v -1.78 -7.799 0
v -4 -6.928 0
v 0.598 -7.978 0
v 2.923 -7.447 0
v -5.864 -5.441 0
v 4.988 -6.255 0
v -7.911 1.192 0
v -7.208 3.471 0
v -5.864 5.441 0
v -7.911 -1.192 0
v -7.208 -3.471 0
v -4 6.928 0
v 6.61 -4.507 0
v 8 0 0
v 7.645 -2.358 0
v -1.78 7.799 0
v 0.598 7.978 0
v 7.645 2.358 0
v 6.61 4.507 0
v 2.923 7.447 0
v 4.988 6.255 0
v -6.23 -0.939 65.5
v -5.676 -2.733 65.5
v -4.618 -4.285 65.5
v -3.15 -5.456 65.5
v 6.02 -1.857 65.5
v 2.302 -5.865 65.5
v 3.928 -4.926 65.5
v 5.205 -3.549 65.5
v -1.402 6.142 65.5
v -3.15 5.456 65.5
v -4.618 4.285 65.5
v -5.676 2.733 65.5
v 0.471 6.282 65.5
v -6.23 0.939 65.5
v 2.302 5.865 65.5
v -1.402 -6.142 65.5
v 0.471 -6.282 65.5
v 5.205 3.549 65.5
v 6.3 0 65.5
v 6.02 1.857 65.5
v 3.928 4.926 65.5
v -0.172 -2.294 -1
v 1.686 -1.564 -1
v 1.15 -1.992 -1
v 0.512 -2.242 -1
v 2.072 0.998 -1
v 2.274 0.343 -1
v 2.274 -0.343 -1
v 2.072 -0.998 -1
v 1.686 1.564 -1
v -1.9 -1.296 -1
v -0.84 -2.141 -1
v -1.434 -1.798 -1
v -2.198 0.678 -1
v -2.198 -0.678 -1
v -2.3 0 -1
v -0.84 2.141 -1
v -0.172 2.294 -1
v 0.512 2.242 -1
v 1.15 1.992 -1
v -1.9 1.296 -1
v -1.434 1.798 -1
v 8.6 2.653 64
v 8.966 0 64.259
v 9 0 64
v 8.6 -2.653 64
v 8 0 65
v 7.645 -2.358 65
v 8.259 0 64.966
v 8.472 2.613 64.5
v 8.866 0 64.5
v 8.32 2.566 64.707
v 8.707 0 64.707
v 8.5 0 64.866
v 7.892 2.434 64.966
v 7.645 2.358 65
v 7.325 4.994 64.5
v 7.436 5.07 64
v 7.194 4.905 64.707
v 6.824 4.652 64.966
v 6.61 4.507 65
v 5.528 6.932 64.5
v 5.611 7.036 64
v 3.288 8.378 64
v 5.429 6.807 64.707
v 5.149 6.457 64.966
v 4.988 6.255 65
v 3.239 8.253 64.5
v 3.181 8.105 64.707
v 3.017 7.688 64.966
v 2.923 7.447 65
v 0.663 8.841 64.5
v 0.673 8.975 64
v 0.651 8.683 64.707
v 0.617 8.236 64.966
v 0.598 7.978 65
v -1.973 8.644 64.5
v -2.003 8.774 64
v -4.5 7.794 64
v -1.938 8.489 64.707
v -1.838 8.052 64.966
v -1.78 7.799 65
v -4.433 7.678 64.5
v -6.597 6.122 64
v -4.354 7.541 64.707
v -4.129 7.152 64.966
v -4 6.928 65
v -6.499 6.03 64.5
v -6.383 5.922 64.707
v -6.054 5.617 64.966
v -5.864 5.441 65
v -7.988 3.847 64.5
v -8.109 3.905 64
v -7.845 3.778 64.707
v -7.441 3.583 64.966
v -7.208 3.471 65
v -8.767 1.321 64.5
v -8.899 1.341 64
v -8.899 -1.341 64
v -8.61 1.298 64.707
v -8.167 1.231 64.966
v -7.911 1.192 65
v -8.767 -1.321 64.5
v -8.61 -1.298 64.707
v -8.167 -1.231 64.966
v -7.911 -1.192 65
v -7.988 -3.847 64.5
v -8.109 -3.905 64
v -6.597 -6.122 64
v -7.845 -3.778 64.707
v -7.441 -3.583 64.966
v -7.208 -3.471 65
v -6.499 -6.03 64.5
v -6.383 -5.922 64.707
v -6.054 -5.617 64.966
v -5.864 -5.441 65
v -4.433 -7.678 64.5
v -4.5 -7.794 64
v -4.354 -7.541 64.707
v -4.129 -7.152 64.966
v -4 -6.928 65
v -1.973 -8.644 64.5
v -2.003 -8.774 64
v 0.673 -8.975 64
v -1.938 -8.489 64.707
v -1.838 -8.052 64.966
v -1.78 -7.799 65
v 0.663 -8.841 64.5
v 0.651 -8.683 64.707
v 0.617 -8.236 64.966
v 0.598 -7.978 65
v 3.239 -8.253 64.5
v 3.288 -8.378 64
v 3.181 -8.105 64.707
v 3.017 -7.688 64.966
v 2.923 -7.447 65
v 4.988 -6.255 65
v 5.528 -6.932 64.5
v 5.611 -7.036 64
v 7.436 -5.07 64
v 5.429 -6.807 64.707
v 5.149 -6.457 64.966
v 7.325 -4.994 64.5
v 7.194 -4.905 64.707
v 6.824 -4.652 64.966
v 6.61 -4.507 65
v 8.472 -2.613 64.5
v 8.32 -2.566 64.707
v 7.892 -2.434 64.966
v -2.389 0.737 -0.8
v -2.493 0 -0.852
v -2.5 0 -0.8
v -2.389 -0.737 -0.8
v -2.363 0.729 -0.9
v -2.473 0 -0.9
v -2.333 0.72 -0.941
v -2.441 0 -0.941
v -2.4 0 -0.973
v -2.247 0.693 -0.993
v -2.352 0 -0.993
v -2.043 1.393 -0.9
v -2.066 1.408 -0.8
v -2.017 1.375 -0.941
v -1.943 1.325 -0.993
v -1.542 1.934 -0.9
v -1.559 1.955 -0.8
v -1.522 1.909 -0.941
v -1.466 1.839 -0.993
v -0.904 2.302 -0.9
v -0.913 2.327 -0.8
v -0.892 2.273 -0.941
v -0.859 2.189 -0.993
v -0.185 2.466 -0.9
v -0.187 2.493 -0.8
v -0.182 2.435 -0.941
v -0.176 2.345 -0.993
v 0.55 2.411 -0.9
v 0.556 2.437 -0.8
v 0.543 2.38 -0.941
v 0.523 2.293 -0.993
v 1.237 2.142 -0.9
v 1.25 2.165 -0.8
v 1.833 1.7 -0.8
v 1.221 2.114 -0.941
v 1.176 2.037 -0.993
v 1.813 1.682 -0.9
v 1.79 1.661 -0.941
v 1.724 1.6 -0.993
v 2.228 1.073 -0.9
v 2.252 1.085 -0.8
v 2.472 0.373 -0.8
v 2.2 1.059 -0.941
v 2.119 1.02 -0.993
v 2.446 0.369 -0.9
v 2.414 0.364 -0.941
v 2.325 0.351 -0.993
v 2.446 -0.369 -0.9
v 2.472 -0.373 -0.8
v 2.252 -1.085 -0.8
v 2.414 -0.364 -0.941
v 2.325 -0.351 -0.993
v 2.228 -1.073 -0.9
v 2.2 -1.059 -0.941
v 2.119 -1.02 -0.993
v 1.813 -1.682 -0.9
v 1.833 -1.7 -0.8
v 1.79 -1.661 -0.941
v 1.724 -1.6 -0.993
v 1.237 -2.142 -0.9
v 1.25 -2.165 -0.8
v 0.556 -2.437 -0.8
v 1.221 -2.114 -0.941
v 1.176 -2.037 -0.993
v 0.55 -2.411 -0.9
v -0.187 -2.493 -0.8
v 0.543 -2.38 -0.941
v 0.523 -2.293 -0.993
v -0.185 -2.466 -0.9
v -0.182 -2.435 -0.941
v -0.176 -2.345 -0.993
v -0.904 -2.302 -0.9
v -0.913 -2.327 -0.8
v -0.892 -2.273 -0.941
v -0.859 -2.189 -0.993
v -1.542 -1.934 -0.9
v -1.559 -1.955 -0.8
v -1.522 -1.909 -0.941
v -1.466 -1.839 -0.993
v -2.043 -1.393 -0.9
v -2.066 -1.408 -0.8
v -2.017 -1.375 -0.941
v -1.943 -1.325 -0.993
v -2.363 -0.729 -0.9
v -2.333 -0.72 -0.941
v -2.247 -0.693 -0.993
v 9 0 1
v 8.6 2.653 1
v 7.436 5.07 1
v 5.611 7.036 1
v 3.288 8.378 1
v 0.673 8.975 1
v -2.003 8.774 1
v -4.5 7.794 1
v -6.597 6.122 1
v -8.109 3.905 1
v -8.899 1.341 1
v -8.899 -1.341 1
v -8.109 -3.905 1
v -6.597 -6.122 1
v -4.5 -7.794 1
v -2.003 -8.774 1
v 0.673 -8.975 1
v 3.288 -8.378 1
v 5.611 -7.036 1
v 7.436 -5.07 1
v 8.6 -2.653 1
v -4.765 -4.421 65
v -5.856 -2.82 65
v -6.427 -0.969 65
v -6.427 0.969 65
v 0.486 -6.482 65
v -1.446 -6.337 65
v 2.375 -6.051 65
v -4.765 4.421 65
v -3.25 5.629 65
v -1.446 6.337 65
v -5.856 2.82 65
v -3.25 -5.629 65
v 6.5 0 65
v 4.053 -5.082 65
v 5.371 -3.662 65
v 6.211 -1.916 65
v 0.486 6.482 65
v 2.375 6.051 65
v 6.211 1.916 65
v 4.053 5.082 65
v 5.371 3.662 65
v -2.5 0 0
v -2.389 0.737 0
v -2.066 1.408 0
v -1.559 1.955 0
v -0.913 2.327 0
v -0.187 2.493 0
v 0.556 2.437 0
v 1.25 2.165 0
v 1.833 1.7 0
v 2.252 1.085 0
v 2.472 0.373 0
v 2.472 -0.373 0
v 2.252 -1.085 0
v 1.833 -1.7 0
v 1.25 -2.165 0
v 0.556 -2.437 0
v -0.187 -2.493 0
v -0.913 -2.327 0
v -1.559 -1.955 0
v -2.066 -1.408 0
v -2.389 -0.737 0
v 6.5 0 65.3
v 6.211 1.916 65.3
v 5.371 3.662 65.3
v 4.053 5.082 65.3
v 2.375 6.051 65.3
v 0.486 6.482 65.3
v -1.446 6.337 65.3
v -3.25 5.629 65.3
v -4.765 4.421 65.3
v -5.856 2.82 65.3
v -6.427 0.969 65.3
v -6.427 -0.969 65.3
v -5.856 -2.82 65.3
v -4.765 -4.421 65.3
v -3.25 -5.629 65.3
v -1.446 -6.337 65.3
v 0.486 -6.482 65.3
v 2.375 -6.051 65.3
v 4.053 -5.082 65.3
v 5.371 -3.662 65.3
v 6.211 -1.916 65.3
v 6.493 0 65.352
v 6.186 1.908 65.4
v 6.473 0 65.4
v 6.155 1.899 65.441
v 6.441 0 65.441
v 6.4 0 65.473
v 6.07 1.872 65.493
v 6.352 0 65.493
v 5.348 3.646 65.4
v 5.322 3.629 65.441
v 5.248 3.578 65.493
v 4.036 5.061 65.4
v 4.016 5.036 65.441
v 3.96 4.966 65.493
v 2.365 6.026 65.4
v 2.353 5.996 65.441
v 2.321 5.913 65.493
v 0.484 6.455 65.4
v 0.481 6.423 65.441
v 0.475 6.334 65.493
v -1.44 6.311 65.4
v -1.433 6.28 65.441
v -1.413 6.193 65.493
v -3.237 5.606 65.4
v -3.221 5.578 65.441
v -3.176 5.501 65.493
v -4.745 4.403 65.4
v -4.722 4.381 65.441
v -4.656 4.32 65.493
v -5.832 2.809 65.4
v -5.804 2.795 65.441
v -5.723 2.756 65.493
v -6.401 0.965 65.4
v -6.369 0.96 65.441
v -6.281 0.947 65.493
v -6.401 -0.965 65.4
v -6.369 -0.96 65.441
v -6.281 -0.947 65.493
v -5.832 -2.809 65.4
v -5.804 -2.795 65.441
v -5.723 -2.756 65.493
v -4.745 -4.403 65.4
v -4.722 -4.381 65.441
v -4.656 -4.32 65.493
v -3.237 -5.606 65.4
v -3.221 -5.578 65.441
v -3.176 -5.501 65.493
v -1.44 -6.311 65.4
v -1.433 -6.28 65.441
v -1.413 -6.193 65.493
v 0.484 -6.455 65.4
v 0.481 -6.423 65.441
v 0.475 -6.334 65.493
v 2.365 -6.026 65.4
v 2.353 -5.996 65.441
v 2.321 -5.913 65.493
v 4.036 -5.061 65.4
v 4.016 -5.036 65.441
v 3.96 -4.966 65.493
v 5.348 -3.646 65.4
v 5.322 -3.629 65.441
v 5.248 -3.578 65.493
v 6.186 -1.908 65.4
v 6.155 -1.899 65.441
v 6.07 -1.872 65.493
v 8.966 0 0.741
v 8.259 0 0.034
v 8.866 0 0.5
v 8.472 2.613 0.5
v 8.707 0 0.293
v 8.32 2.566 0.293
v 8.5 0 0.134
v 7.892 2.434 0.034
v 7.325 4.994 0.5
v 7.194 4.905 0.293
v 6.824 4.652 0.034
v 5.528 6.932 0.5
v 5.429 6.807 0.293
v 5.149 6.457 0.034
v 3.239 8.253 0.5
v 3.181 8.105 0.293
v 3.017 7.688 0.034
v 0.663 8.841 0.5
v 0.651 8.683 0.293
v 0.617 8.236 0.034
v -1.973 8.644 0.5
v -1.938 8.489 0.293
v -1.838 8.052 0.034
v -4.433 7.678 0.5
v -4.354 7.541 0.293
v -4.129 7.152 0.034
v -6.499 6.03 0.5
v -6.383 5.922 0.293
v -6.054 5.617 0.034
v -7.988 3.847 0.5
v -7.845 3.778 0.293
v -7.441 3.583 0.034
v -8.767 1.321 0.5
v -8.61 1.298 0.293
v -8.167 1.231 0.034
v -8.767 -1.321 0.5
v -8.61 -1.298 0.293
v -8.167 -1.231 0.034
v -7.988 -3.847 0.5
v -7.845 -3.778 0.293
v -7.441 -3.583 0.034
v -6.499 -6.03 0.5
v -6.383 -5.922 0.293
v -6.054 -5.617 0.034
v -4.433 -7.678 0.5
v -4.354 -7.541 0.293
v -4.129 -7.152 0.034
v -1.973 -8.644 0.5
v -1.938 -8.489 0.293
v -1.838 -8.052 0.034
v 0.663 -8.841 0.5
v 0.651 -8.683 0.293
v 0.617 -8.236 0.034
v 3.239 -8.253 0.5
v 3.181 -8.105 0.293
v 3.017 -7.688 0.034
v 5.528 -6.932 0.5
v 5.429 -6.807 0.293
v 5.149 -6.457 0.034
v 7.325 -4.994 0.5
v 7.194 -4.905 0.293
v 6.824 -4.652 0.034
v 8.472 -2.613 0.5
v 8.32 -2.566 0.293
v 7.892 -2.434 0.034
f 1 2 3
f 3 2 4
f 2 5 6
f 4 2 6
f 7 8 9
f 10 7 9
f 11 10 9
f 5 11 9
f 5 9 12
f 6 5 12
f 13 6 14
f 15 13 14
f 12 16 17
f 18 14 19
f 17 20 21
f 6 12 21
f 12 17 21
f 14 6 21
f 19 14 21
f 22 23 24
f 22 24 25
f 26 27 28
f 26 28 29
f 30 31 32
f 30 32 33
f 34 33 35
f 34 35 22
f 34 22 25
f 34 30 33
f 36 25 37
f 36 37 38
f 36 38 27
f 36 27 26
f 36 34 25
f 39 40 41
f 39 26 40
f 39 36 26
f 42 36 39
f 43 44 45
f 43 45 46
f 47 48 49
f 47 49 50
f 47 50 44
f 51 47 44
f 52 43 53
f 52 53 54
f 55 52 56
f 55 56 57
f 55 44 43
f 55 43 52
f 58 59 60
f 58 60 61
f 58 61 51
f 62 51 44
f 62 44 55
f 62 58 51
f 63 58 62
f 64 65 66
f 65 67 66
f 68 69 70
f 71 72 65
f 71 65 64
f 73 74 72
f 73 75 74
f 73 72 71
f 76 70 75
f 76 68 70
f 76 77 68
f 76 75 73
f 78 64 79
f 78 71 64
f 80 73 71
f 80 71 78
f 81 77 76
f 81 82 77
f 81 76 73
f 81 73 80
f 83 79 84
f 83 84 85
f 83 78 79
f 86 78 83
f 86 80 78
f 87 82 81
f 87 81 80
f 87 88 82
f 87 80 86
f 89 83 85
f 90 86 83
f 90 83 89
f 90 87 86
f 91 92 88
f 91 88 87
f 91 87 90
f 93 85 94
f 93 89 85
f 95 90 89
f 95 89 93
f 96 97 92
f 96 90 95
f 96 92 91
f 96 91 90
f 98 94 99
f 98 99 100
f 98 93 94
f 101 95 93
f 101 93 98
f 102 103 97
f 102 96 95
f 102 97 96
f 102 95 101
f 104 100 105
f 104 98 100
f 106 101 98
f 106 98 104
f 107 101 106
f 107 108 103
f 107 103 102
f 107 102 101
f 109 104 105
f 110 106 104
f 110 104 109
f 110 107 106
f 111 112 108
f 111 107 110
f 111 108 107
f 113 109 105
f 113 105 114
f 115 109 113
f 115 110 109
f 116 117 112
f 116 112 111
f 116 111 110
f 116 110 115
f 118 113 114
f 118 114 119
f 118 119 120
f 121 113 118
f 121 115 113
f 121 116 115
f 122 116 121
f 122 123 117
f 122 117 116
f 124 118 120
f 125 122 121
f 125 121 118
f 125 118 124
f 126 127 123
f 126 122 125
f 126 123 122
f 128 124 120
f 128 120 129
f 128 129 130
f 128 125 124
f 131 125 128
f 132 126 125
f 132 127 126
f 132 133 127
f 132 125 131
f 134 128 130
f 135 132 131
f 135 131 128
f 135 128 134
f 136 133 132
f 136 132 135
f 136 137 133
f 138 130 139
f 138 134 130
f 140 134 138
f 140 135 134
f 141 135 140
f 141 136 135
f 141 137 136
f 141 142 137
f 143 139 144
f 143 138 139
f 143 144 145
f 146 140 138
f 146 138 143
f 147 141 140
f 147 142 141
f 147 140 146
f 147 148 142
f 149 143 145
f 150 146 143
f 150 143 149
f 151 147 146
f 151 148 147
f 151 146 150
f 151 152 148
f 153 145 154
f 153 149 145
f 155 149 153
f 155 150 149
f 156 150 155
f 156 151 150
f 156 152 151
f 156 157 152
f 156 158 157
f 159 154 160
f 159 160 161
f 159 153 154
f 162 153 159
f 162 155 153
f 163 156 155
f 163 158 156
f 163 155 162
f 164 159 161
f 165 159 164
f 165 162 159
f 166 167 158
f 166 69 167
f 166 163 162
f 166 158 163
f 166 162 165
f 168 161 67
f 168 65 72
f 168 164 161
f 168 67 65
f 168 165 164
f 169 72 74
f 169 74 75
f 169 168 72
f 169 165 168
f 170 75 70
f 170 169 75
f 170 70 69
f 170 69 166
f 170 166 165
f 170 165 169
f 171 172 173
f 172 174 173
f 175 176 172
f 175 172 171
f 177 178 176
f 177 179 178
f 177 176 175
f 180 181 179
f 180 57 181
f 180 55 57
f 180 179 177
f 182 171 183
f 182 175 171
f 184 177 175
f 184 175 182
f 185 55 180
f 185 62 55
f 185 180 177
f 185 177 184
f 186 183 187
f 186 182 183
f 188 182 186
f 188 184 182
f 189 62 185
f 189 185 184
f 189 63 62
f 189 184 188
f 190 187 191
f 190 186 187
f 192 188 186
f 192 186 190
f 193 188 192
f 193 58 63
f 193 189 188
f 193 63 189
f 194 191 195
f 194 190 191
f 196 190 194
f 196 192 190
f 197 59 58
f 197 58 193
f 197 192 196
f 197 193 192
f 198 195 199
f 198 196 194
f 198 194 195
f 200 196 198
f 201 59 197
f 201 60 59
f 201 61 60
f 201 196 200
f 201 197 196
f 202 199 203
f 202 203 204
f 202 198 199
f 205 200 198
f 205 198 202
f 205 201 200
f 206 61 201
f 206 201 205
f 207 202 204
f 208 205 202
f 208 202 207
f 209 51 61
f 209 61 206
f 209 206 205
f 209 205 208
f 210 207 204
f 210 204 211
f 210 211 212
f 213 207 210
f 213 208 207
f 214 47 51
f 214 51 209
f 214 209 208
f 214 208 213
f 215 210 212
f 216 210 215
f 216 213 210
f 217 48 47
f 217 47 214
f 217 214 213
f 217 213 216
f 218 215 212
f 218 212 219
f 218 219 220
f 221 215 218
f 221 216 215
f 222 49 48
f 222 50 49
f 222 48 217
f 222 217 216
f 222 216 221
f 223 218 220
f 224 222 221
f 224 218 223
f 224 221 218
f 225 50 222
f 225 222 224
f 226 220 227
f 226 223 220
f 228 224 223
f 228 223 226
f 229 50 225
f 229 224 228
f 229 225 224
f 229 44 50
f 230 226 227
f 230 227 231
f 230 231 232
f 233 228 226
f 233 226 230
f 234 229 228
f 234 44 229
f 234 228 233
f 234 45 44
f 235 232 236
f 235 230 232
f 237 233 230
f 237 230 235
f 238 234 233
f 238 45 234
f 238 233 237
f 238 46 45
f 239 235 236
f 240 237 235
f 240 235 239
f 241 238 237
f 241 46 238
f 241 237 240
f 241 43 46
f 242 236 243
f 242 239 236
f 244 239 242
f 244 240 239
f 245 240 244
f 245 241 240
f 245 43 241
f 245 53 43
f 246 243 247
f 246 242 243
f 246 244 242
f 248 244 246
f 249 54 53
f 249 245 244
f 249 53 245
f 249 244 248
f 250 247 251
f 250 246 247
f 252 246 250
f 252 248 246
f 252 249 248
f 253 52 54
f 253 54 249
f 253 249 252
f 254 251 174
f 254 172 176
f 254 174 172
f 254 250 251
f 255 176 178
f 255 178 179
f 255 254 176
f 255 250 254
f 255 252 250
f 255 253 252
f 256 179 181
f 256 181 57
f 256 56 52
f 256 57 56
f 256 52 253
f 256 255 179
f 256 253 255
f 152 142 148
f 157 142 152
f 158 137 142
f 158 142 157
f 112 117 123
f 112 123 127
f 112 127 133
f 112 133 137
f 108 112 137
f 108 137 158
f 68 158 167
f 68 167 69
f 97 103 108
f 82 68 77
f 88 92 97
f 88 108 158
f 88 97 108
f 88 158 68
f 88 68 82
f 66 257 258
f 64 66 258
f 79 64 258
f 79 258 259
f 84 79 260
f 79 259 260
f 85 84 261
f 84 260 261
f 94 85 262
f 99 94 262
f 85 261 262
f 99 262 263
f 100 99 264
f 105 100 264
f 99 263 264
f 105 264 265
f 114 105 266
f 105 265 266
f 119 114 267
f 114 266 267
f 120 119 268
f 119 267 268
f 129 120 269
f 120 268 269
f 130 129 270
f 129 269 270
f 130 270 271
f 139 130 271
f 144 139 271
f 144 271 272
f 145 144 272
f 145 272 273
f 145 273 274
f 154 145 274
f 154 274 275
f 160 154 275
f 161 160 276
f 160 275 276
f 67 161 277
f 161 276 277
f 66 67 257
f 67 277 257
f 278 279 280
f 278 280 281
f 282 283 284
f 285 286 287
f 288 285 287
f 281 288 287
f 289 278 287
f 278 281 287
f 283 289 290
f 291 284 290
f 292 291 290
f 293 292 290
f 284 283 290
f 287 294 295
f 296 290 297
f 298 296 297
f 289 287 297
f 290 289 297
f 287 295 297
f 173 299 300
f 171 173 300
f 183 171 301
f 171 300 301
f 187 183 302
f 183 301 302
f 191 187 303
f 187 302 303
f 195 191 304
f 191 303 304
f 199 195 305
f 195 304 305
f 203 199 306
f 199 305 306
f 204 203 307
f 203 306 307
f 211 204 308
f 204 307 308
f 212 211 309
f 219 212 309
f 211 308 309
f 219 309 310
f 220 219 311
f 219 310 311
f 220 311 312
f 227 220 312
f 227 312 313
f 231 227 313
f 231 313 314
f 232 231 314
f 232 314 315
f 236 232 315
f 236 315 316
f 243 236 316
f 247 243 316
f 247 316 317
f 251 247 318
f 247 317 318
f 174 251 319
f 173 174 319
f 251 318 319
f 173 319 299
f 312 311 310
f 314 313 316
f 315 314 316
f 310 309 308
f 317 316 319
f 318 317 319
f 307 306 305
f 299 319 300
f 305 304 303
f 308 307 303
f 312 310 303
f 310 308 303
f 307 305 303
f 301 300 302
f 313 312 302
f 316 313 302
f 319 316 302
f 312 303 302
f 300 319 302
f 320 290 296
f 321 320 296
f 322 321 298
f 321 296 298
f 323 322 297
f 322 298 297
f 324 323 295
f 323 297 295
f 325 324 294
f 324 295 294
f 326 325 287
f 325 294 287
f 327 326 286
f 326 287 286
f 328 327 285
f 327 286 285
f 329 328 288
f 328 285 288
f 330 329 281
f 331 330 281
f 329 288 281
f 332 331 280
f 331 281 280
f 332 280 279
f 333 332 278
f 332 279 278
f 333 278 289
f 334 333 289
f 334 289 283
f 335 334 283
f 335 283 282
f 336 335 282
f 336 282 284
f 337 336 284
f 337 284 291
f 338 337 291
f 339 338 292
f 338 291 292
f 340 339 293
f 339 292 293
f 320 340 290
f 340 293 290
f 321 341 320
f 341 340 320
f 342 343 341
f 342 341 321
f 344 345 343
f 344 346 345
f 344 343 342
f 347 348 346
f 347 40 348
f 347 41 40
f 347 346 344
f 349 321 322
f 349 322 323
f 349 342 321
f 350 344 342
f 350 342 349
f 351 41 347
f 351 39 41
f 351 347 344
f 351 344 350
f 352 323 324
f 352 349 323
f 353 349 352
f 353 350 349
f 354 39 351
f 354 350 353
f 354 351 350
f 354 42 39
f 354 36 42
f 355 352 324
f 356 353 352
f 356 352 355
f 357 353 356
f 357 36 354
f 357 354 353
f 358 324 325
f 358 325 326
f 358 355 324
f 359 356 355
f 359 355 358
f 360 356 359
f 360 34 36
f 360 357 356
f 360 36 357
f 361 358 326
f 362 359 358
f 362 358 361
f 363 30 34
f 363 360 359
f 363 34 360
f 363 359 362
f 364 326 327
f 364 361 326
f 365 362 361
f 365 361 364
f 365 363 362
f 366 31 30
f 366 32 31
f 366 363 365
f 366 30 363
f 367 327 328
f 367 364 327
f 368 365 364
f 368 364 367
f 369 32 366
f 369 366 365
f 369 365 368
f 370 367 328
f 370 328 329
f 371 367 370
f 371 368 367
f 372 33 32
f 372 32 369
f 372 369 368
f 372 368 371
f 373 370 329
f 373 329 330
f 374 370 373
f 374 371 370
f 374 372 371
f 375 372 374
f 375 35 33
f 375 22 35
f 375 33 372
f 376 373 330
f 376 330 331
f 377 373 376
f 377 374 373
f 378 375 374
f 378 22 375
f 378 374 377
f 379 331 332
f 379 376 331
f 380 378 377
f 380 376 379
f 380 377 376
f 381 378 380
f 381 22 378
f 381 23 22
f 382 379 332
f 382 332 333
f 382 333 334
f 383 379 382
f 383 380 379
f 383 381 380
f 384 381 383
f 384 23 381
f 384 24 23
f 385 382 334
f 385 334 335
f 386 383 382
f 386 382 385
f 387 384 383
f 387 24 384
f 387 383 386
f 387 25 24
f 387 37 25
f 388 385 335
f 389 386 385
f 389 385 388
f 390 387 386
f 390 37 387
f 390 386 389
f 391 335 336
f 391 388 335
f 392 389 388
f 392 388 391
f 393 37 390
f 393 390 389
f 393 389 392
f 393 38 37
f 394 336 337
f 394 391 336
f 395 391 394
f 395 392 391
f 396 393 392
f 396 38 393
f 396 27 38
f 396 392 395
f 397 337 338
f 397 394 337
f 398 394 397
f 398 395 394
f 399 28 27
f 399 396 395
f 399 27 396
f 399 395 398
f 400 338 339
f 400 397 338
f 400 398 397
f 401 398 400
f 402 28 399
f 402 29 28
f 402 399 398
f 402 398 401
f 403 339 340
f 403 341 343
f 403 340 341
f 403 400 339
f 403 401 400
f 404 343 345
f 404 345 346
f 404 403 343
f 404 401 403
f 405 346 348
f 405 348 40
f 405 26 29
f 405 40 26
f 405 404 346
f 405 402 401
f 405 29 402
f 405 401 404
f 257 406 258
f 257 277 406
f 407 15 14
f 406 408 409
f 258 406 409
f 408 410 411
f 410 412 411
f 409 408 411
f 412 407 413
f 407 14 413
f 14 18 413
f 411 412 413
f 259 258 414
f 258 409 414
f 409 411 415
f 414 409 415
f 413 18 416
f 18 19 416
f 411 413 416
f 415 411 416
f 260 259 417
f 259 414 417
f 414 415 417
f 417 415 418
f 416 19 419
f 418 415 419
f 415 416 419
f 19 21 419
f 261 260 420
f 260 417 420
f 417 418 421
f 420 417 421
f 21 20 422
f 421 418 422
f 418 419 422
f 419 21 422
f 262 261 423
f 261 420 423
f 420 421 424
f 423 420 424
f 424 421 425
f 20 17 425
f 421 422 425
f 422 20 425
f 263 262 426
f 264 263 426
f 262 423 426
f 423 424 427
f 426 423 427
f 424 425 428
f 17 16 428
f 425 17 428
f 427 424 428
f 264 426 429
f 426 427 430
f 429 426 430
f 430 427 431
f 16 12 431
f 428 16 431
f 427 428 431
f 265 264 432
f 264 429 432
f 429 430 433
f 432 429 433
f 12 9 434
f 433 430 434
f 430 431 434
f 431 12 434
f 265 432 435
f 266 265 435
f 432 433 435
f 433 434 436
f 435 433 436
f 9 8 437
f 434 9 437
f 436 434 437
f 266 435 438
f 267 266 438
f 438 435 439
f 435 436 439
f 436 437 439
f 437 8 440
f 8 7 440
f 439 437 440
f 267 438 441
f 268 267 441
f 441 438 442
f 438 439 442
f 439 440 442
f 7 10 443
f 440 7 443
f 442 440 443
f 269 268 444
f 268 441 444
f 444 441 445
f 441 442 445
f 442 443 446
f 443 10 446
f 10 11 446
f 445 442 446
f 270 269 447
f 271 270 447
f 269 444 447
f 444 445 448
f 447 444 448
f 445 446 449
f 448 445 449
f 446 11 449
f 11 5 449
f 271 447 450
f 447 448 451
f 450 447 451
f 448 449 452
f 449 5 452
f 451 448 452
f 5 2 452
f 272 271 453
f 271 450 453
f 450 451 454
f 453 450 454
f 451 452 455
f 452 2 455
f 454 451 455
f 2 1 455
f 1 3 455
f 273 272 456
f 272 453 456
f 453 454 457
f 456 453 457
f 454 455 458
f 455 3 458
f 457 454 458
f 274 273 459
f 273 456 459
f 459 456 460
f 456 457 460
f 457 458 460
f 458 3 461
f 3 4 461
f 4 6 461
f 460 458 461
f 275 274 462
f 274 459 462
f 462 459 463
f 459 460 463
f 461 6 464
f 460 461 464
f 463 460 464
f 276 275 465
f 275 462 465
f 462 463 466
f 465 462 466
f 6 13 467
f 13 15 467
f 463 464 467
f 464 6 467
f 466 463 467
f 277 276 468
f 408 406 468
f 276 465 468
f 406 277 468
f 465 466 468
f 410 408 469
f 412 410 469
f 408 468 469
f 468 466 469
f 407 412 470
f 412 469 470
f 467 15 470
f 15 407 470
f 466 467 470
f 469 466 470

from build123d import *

# Parameters (mm, degrees)
SKETCH_1_R      = 9
EXTRUDE_1_DEPTH = 65
FILLET_1_R      = 1
SKETCH_2_R      = 2.5
EXTRUDE_2_DEPTH = 1
SKETCH_3_R      = 6.5
EXTRUDE_3_DEPTH = 0.5
FILLET_2_R      = 0.2
FILLET_3_R      = 0.2


with BuildPart() as part:
    # Эскиз1 → Бобышка-Вытянуть1 (new body)
    with BuildSketch(Plane.XY):
        Circle(SKETCH_1_R)
    extrude(amount=EXTRUDE_1_DEPTH)

    # Скругление1
    fillet_1_edges = [part.edges().sort_by_distance(p)[0] for p in [
        (-9, 0, 0),
        (-9, 0, 65),
    ]]
    fillet(fillet_1_edges, radius=FILLET_1_R)


with BuildPart() as body_2:
    # Эскиз2 → Бобышка-Вытянуть2 (new body)
    with BuildSketch(Plane(origin=(0, 0, 0), x_dir=(-1, 0, 0), z_dir=(0, 0, -1))):
        Circle(SKETCH_2_R)
    extrude(amount=EXTRUDE_2_DEPTH)

    # Скругление2
    fillet_2_edges = [body_2.edges().sort_by_distance(p)[0] for p in [
        (2.5, 0, -1),
    ]]
    fillet(fillet_2_edges, radius=FILLET_2_R)


with BuildPart() as body_3:
    # Эскиз3 → Бобышка-Вытянуть3 (new body)
    with BuildSketch(Plane.XY.offset(65)):
        Circle(SKETCH_3_R)
    extrude(amount=EXTRUDE_3_DEPTH)

    # Скругление3
    fillet_3_edges = [body_3.edges().sort_by_distance(p)[0] for p in [
        (-6.5, 0, 65.5),
    ]]
    fillet(fillet_3_edges, radius=FILLET_3_R)


solid = Compound([part.part, body_2.part, body_3.part])
